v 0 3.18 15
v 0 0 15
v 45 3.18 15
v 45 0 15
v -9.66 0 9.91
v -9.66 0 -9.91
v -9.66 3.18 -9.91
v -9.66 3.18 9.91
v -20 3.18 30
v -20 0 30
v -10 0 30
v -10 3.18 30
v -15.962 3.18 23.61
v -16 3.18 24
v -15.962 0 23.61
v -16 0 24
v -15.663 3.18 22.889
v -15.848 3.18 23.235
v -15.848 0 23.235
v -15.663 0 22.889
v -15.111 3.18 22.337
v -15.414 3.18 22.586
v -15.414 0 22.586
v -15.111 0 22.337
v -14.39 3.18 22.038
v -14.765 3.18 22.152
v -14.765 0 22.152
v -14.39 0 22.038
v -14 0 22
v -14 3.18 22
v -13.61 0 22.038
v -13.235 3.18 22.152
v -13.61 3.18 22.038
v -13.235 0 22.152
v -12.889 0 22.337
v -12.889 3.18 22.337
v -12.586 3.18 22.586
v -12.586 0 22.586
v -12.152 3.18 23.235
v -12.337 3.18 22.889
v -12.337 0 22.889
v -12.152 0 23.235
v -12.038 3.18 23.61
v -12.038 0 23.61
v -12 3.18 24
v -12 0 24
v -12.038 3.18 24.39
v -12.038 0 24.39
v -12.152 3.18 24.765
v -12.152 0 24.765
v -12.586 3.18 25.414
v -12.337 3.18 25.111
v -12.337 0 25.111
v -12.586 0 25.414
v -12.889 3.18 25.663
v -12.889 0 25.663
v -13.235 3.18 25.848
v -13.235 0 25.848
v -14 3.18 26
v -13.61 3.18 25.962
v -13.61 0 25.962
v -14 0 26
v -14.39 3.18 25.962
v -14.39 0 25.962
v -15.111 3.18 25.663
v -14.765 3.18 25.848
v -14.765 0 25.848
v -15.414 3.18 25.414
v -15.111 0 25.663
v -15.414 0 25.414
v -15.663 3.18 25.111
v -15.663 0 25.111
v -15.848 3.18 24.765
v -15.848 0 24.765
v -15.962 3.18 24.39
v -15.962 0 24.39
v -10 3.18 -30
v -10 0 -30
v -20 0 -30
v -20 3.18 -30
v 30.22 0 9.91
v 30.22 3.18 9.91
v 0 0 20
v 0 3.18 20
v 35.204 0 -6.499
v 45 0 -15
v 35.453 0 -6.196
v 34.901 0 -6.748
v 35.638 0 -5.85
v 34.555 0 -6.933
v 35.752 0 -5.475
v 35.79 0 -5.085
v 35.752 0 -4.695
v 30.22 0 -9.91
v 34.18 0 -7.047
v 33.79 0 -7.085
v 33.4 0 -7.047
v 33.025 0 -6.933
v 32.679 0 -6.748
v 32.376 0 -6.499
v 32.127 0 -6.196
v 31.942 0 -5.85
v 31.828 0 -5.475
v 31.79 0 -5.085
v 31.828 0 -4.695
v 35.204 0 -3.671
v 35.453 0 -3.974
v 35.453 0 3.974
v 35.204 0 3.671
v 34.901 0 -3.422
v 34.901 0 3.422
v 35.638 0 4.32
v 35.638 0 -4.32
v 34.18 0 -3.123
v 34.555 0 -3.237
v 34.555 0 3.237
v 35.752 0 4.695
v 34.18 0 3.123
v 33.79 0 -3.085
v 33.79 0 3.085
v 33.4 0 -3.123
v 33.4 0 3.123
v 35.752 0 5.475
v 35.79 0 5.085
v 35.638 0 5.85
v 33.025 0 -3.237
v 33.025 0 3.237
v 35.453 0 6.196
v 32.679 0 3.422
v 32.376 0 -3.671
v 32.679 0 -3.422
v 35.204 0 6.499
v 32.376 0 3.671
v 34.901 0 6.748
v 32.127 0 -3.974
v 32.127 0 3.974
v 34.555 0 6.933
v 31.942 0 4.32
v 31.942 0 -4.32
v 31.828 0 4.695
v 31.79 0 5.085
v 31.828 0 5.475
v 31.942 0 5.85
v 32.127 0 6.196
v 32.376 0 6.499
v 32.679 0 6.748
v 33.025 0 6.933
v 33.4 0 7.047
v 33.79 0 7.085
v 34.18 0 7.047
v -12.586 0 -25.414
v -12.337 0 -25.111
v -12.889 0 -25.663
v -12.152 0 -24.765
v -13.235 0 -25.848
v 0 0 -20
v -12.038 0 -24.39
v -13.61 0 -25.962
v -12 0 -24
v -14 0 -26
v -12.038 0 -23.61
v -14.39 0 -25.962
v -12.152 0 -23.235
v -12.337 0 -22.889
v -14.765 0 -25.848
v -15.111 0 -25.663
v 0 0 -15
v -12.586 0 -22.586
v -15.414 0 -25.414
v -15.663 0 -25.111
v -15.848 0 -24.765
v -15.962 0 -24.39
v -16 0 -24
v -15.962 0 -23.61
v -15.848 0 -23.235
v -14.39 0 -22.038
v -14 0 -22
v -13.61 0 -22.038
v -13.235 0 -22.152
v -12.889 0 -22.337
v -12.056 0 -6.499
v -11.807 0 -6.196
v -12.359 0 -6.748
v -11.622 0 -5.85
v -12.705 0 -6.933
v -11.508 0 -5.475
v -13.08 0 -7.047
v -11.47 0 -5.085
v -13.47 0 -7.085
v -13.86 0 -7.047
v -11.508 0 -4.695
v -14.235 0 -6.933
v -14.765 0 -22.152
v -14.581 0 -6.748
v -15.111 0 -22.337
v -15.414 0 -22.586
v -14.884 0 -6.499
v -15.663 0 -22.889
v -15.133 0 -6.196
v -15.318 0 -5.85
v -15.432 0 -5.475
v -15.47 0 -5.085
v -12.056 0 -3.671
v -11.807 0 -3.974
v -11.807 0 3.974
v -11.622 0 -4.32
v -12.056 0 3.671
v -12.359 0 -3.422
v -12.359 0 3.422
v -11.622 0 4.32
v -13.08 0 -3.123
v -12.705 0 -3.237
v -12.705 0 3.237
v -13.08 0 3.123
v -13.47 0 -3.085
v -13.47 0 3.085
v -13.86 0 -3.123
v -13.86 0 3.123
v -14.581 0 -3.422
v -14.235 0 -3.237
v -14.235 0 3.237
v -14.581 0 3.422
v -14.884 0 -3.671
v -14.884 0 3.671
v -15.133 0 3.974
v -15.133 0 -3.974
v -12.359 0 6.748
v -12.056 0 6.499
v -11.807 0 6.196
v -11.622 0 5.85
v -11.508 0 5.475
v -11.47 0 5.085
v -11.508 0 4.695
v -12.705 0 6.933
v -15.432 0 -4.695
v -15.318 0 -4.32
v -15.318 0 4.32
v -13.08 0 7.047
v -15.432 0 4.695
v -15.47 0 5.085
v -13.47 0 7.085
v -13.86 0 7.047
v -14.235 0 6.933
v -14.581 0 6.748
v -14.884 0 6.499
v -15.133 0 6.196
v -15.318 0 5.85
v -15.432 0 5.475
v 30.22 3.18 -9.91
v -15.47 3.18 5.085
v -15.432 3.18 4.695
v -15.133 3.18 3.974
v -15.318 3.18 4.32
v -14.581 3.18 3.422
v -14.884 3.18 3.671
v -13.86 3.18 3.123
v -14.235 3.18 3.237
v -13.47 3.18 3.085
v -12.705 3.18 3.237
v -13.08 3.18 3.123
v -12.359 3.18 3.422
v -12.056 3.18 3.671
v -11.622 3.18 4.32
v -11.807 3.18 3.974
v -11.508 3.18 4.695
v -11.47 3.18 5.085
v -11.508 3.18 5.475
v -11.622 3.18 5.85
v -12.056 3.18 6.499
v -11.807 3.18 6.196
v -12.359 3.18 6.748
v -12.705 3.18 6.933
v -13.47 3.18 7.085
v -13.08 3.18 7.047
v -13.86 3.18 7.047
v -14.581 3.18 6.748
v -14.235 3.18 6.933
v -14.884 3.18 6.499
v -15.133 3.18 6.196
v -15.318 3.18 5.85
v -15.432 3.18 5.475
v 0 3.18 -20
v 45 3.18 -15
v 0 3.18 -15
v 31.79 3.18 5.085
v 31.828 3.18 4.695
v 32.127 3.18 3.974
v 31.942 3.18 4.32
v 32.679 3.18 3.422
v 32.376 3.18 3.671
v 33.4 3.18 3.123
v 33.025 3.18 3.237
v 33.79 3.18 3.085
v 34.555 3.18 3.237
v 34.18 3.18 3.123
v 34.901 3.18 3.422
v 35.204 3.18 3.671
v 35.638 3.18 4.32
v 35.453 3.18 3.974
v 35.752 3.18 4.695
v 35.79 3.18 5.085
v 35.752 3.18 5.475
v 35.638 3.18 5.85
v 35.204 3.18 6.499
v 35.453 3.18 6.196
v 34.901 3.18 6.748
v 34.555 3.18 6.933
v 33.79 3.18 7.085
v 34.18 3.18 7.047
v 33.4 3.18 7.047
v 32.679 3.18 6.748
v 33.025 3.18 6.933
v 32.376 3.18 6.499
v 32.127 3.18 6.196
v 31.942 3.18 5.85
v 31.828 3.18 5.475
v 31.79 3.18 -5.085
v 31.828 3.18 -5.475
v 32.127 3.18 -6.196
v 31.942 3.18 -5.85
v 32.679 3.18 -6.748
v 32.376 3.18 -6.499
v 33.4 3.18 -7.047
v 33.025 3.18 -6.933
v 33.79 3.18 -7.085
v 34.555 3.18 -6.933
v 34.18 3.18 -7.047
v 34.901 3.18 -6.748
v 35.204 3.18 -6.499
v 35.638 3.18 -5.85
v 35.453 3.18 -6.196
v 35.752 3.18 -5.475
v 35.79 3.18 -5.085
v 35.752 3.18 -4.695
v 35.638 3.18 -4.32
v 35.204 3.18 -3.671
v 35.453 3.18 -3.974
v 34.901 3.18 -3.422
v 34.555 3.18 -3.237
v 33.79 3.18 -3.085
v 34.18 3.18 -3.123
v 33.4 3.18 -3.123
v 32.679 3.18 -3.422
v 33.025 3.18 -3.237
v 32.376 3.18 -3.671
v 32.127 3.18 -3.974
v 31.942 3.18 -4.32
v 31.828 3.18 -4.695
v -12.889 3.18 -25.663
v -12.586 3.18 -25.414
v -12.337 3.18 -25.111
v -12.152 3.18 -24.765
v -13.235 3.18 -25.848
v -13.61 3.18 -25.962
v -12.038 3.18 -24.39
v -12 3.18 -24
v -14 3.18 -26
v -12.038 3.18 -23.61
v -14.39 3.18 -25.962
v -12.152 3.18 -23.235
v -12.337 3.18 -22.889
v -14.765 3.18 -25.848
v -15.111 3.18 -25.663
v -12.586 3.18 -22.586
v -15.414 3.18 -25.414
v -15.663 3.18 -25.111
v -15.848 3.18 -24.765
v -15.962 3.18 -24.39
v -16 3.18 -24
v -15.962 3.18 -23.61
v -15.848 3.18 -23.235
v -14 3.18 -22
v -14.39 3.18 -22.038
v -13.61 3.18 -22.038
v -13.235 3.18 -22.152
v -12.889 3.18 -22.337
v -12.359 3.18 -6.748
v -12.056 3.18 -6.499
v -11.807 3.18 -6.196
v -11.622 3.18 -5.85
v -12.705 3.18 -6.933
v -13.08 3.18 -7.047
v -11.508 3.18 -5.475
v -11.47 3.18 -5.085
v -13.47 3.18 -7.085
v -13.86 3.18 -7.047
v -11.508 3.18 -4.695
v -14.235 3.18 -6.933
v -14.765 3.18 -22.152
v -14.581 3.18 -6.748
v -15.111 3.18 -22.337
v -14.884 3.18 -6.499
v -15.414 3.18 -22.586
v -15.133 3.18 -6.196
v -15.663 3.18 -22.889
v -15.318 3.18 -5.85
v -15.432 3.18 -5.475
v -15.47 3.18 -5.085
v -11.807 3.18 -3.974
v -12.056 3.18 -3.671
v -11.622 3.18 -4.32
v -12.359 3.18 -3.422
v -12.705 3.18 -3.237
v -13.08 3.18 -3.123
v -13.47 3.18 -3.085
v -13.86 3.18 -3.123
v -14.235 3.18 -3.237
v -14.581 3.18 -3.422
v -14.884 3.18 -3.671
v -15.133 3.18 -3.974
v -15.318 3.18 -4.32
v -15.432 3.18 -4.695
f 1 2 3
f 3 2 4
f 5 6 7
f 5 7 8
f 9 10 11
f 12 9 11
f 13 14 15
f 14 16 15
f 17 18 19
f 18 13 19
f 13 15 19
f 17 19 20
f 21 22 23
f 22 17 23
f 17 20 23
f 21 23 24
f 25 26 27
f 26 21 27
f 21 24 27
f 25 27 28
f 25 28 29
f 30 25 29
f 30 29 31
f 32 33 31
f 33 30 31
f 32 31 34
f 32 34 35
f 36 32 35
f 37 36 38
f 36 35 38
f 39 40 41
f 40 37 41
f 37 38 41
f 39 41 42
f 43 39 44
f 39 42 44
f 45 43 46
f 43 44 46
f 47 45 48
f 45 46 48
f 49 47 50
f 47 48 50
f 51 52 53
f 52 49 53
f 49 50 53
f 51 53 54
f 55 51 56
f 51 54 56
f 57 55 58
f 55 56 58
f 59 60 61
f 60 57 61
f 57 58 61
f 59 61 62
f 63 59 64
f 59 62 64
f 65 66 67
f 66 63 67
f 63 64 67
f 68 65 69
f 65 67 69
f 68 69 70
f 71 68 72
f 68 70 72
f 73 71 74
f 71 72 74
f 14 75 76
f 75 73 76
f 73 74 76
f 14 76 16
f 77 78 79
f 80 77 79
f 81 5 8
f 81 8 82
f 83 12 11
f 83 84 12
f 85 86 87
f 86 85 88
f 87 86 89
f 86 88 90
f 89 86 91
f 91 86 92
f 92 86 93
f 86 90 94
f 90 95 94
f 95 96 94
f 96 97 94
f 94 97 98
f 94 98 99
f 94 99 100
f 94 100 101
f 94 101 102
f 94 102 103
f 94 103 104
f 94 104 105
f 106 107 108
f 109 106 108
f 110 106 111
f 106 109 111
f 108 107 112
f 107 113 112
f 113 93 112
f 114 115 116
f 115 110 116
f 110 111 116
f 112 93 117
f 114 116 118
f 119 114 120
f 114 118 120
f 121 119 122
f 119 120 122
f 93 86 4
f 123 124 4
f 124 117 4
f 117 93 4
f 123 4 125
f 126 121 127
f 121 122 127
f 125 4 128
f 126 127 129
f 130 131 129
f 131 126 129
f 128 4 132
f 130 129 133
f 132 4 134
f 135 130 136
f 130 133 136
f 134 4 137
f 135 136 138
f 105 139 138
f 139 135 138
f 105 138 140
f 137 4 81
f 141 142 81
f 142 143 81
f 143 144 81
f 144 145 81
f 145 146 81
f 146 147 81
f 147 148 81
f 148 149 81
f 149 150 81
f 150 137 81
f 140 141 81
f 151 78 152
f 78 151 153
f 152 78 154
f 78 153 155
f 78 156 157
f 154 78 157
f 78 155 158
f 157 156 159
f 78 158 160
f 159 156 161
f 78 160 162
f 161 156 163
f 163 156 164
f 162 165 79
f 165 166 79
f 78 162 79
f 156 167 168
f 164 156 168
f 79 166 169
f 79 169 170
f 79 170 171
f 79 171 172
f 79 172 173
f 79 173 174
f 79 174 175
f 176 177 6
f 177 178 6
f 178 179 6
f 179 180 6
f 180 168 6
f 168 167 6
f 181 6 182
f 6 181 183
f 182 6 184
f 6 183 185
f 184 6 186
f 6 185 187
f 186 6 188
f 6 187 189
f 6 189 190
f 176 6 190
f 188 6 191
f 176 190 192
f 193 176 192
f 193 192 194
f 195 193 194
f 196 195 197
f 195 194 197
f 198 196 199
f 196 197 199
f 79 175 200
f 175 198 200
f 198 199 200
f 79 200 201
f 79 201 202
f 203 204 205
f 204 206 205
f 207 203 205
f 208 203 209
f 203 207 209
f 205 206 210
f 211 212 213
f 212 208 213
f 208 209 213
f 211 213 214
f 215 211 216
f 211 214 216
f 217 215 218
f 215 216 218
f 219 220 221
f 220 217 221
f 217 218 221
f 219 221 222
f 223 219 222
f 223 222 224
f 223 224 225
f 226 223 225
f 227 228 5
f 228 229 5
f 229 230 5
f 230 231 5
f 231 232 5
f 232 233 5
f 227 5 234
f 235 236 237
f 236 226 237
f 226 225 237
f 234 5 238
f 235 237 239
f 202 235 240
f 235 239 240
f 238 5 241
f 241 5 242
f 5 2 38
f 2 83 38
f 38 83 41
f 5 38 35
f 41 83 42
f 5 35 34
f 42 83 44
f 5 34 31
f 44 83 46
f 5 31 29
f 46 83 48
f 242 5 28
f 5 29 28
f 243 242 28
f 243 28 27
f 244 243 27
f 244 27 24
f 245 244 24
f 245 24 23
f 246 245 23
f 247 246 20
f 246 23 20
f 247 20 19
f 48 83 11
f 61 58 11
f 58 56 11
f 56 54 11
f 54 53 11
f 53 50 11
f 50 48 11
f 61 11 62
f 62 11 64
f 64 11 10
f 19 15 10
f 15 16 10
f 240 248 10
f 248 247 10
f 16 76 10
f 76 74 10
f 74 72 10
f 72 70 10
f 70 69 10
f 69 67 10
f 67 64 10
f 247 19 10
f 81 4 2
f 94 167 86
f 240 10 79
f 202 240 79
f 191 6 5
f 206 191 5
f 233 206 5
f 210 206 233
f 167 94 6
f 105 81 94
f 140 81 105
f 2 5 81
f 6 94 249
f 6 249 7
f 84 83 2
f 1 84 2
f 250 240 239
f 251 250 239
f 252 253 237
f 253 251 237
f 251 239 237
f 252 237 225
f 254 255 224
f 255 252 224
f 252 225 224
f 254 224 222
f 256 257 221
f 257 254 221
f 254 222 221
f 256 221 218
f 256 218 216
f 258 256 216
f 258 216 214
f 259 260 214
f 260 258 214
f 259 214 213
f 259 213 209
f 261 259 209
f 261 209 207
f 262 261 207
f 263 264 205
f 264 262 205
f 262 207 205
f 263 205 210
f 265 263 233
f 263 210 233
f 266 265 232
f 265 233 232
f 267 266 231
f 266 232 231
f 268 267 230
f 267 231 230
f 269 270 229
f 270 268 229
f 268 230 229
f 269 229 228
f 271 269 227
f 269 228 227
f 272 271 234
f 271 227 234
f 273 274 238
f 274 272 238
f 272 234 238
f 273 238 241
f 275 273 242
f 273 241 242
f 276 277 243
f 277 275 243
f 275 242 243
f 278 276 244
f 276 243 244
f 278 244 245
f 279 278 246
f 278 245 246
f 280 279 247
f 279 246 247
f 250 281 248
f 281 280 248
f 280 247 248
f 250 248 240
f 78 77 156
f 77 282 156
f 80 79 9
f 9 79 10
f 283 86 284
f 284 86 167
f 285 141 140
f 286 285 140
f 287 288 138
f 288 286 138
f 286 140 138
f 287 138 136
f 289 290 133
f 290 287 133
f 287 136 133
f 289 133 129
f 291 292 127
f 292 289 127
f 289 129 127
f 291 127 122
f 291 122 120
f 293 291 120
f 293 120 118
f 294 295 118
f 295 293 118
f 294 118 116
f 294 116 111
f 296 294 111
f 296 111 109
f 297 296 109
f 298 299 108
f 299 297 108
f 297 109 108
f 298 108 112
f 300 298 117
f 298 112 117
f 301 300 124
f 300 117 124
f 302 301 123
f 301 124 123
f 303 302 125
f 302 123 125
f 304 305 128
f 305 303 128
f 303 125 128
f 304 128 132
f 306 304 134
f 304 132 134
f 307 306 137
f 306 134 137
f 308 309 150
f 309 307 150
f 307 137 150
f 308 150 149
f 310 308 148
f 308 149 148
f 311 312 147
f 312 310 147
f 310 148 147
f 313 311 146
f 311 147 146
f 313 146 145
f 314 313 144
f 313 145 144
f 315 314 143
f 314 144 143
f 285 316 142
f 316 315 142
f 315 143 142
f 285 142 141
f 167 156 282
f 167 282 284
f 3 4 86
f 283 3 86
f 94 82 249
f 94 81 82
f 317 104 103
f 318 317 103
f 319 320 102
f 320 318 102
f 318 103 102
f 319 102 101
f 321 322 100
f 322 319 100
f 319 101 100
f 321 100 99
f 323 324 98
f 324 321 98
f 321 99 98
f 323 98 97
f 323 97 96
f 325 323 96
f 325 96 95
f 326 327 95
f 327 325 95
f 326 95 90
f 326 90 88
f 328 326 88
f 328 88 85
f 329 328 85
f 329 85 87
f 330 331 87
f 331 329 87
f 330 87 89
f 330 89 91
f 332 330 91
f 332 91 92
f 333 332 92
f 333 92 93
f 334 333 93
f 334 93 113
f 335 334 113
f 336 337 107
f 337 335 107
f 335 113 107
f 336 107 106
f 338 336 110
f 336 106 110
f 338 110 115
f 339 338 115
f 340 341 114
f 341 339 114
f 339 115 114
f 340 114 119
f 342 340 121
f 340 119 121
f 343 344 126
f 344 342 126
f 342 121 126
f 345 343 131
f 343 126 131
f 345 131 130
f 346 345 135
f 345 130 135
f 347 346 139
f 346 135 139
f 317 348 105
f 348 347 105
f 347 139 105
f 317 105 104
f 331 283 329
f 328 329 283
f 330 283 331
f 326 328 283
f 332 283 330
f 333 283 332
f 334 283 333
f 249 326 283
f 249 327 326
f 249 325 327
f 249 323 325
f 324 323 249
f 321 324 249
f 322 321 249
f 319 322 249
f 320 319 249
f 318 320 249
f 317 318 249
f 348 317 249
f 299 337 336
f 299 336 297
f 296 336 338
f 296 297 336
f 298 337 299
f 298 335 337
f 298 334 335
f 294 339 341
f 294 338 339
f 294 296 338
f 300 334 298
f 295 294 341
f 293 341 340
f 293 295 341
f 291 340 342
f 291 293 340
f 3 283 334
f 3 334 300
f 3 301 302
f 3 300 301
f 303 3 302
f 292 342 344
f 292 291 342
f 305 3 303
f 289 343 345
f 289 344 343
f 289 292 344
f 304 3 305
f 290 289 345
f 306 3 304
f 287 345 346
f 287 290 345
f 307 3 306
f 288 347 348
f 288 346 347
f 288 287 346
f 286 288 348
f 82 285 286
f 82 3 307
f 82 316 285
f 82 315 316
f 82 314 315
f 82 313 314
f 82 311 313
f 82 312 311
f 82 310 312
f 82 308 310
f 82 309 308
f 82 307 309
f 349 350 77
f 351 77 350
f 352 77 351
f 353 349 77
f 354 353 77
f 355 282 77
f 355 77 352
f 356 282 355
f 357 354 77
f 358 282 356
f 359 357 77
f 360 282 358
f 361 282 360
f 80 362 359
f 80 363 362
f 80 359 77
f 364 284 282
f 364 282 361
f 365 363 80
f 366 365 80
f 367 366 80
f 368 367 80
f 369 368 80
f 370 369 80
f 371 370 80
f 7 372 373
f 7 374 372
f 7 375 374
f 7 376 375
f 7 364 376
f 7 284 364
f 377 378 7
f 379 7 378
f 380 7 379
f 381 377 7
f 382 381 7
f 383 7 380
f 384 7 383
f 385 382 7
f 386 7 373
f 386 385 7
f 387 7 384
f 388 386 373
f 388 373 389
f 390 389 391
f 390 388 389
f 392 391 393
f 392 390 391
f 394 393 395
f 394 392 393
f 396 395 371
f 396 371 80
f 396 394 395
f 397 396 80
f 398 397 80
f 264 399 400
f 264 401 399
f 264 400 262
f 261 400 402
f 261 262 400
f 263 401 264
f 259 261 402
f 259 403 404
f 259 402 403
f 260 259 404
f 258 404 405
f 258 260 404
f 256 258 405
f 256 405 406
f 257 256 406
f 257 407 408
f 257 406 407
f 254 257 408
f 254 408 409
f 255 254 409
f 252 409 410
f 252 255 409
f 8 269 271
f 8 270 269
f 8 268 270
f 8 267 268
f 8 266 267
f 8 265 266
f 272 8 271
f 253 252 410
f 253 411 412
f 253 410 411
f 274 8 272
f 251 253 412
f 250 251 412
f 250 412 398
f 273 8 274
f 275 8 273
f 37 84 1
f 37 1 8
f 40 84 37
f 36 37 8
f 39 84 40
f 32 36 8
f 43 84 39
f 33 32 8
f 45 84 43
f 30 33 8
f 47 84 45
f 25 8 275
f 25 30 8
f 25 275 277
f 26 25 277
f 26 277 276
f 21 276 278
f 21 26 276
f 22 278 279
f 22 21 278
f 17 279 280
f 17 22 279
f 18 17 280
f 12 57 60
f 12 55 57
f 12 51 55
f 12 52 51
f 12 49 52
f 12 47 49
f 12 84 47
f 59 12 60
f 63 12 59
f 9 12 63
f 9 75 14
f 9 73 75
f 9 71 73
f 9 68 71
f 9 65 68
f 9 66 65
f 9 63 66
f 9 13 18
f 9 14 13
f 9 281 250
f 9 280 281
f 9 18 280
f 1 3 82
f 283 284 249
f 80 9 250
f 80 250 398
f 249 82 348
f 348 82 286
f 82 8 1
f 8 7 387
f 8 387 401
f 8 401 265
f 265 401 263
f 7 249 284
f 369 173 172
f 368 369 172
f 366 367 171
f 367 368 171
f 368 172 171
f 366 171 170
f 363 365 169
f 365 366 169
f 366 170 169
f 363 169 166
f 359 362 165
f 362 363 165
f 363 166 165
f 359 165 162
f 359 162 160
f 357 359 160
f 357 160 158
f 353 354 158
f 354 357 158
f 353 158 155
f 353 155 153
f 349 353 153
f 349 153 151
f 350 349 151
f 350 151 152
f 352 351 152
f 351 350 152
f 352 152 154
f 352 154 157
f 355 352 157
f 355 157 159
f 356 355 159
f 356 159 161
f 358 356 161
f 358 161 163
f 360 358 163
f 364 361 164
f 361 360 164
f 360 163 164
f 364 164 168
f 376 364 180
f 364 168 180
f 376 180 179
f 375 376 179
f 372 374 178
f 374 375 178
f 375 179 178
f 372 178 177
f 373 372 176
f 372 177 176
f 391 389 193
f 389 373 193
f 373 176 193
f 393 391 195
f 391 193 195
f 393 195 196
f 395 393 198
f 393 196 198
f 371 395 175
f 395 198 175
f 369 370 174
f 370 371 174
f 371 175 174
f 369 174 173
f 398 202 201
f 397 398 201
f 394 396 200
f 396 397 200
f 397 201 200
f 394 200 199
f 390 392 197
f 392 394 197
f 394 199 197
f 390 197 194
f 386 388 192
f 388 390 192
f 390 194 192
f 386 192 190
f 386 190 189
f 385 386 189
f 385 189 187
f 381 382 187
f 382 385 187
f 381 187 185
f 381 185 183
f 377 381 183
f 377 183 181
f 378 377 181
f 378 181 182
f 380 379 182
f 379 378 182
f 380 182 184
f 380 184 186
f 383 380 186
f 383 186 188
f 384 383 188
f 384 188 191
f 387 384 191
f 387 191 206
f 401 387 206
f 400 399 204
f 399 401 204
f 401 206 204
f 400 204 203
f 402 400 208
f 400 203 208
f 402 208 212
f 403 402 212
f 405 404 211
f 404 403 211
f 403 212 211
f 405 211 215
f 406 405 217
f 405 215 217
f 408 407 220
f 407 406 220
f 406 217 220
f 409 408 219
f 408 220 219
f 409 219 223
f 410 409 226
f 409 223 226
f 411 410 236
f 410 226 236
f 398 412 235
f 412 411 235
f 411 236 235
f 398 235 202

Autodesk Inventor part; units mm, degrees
ref_plane "YZ Plane" through (0, 0, 0) normal (1, 0, 0) x (0, 1, 0)
ref_plane "XZ Plane" through (0, 0, 0) normal (0, 1, 0) x (-1, 0, 0)
ref_plane "XY Plane" through (0, 0, 0) normal (0, 0, 1) x (1, 0, 0)
sketch "Sketch2" plane through (0, 0, 0) normal (0, 1, 0) x (-1, 0, 0)
  circle A0 centre (-33.79, -5.085) radius 2
  circle A1 centre (-33.79, 5.085) radius 2
  circle A2 centre (13.47, -5.085) radius 2
  circle A3 centre (13.47, 5.085) radius 2
  line L0 (20, 15) -> (-45, 15)
  line L1 (-45, 15) -> (-45, -15)
  line L2 (-45, -15) -> (20, -15)
  line L3 (20, -15) -> (20, 15)
  line L4 (20, 30) -> (0, 30)
  line L5 (0, -30) -> (20, -30)
  line L6 (20, -30) -> (20, 30)
  circle A4 centre (14, 24) radius 2
  circle A5 centre (14, -24) radius 2
  line L7 (0, 30) -> (0, 15)
  line L8 (0, -30) -> (0, -15)
  line L9 (9.66, 9.91) -> (-30.22, 9.91)
  line L10 (-30.22, 9.91) -> (-30.22, -9.91)
  line L11 (-30.22, -9.91) -> (9.66, -9.91)
  line L12 (9.66, -9.91) -> (9.66, 9.91)
  point P0 (0, 0)
  dimension "d27" = 4
  dimension "d28" = 4
  dimension "d29" = 4
  dimension "d30" = 4
  dimension "d31" = 13.47
  dimension "d32" = 5.085
  dimension "d33" = 10.17
  dimension "d34" = 13.47
  dimension "d35" = 33.79
  dimension "d36" = 5.085
  dimension "d37" = 10.17
  dimension "d38" = 33.79
  dimension "d39" = 30
  dimension "d40" = 65
  dimension "d41" = 20
  dimension "d42" = 15
  dimension "d43" = 60
  dimension "d44" = 30
  dimension "d45" = 20
  dimension "d46" = 4
  dimension "d47" = 4
  dimension "d48" = 6
  dimension "d49" = 6
  dimension "d50" = 6
  dimension "d51" = 6
  dimension "d52" = 9.66
  dimension "d53" = 19.82
  dimension "d54" = 9.91
  dimension "d55" = 39.88
extrude "Extrusion2" add sketch "Sketch2" along normal blind 3.18
chamfer "Chamfer1" distance 10 angle 45 1 edges at (0, 1.59, -30)
chamfer "Chamfer2" distance 10 angle 45 1 edges at (0, 1.59, 30)
properties part number "Pinza_sostenedor"
